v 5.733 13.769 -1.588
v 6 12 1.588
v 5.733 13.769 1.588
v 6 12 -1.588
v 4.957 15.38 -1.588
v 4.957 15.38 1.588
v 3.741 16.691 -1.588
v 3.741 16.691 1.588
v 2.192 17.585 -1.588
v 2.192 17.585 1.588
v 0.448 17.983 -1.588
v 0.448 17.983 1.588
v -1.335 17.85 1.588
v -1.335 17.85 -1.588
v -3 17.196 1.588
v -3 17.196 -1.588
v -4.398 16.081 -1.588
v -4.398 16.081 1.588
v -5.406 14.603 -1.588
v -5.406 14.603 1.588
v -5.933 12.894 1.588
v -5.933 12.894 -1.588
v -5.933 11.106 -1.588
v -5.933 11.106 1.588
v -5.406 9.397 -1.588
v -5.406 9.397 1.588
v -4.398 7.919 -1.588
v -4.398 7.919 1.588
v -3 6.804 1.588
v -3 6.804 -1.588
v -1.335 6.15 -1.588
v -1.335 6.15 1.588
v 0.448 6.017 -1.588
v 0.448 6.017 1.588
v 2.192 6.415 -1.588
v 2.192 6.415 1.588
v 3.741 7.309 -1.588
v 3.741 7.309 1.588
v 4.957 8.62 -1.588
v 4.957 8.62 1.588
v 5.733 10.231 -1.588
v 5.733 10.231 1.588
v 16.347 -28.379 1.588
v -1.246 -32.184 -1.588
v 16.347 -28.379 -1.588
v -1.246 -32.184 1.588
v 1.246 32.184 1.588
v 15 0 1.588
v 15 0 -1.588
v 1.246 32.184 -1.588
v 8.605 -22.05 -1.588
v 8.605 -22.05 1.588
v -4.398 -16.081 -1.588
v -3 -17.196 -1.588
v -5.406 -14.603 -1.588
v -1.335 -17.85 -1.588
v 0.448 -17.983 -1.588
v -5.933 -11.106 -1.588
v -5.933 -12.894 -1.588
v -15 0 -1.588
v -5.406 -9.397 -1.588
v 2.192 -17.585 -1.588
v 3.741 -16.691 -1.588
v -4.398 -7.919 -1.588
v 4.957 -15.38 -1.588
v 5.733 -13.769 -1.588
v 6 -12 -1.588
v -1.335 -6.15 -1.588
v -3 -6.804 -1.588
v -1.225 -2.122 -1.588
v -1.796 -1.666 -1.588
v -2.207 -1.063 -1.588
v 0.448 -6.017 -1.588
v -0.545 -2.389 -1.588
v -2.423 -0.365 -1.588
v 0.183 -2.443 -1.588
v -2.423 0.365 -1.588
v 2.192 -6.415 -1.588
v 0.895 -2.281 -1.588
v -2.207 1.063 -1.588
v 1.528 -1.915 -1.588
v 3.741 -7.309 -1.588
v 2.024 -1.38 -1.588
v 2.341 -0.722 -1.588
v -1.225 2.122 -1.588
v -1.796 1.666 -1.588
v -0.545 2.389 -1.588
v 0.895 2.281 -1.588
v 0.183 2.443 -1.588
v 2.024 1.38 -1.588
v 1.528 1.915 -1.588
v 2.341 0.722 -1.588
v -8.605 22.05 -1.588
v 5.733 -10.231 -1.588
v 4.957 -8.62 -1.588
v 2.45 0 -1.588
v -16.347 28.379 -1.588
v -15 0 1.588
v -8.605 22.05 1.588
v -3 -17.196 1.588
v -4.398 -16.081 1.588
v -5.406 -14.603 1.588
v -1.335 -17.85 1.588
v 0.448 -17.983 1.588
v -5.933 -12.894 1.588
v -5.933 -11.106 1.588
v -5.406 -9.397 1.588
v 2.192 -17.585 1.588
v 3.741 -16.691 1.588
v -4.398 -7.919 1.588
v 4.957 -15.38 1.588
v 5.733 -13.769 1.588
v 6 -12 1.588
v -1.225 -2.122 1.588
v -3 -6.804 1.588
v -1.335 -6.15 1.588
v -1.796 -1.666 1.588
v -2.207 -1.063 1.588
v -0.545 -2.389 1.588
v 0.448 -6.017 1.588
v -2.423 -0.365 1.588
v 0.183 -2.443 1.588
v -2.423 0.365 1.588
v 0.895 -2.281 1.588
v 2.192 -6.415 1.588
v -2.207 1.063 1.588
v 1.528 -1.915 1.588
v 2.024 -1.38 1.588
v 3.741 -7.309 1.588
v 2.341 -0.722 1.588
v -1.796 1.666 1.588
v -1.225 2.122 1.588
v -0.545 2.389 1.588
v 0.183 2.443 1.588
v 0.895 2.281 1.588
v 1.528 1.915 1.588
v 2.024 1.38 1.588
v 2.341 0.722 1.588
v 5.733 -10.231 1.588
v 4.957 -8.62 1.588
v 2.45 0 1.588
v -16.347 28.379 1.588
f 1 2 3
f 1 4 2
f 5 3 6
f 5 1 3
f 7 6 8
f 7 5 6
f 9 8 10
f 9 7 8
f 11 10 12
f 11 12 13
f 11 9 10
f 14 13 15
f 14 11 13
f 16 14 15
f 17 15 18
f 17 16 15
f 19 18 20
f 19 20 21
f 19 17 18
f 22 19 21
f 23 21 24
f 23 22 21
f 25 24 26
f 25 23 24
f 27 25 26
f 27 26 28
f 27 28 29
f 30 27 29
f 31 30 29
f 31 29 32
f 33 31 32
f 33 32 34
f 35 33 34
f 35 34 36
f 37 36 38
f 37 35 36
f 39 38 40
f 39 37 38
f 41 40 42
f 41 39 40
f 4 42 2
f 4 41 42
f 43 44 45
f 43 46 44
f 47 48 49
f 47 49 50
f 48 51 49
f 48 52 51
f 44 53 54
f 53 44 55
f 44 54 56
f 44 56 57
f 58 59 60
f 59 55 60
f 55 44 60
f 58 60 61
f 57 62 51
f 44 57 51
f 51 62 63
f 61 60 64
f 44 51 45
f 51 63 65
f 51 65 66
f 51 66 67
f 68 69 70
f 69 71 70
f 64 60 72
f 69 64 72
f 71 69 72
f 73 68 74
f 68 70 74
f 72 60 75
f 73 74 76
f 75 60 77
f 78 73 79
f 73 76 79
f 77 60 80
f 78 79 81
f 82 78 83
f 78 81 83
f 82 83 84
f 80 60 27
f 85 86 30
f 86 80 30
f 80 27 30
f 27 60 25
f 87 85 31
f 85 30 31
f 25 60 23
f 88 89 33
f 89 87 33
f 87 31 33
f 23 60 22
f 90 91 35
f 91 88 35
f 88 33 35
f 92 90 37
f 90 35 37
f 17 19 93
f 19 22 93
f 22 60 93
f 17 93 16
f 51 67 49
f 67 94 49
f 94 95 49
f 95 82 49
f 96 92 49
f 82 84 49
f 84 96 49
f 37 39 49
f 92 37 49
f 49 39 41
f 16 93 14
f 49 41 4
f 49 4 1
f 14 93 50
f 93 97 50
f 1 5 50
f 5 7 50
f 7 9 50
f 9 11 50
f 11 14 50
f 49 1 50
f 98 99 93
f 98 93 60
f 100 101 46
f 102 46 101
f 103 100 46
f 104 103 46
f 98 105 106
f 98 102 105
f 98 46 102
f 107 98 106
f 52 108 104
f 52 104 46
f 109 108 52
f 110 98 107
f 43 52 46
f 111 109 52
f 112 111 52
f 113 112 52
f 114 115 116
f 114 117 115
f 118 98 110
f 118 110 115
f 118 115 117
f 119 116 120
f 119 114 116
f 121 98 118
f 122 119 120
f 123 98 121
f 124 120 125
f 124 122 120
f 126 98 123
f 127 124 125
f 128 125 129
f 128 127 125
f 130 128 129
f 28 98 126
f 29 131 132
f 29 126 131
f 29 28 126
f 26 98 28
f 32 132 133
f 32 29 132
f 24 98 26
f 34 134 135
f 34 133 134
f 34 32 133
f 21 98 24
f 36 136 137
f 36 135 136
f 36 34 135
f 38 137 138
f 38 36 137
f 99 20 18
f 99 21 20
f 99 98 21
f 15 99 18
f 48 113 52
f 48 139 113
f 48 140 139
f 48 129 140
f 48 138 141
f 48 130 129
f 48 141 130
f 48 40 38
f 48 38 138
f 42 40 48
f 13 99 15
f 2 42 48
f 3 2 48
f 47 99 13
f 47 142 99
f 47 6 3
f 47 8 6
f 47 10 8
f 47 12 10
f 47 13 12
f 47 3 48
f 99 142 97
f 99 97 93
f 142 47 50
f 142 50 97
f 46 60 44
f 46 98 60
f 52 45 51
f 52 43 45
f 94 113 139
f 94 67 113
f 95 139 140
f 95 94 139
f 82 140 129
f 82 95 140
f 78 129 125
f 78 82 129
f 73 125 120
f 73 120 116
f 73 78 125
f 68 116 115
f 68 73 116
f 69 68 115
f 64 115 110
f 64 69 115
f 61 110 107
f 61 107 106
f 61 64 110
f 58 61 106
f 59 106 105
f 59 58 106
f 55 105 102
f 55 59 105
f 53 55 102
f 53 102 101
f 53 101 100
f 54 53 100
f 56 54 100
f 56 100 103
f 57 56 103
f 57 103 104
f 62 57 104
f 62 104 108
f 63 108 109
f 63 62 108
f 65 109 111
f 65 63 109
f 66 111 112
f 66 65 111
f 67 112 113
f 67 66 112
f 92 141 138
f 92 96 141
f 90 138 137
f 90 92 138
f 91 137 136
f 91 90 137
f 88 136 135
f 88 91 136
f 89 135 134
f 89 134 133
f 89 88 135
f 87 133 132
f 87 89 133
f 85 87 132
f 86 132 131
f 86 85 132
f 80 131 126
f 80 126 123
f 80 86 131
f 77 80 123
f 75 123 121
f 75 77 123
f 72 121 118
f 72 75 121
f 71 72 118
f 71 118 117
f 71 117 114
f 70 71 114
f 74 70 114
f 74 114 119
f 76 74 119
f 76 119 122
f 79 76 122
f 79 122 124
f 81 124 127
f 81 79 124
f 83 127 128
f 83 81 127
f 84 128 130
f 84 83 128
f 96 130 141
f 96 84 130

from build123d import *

# Parameters (mm, degrees)
F0_R     = 6
F0_R_2   = 2.45
F1_DEPTH = 1.5875


with BuildPart() as f1:
    # F0 (on Top) → F1 (new body, symmetric)
    with BuildSketch(Plane.XY):
        Polygon((8.6046455833, -22.0503536392), (15, 0), (1.2463501788, 32.1844235088), (-16.3468942976, 28.3794598042), (-8.6046455833, 22.0503536392), (-15, 0), (-1.2463501788, -32.1844235088), (16.3468942976, -28.3794598042), align=None)
        with Locations((0, -12)):
            Circle(F0_R, mode=Mode.SUBTRACT)
        Circle(F0_R_2, mode=Mode.SUBTRACT)
        with Locations((0, 12)):
            Circle(F0_R, mode=Mode.SUBTRACT)
    extrude(amount=F1_DEPTH, both=True)


solid = f1.part
